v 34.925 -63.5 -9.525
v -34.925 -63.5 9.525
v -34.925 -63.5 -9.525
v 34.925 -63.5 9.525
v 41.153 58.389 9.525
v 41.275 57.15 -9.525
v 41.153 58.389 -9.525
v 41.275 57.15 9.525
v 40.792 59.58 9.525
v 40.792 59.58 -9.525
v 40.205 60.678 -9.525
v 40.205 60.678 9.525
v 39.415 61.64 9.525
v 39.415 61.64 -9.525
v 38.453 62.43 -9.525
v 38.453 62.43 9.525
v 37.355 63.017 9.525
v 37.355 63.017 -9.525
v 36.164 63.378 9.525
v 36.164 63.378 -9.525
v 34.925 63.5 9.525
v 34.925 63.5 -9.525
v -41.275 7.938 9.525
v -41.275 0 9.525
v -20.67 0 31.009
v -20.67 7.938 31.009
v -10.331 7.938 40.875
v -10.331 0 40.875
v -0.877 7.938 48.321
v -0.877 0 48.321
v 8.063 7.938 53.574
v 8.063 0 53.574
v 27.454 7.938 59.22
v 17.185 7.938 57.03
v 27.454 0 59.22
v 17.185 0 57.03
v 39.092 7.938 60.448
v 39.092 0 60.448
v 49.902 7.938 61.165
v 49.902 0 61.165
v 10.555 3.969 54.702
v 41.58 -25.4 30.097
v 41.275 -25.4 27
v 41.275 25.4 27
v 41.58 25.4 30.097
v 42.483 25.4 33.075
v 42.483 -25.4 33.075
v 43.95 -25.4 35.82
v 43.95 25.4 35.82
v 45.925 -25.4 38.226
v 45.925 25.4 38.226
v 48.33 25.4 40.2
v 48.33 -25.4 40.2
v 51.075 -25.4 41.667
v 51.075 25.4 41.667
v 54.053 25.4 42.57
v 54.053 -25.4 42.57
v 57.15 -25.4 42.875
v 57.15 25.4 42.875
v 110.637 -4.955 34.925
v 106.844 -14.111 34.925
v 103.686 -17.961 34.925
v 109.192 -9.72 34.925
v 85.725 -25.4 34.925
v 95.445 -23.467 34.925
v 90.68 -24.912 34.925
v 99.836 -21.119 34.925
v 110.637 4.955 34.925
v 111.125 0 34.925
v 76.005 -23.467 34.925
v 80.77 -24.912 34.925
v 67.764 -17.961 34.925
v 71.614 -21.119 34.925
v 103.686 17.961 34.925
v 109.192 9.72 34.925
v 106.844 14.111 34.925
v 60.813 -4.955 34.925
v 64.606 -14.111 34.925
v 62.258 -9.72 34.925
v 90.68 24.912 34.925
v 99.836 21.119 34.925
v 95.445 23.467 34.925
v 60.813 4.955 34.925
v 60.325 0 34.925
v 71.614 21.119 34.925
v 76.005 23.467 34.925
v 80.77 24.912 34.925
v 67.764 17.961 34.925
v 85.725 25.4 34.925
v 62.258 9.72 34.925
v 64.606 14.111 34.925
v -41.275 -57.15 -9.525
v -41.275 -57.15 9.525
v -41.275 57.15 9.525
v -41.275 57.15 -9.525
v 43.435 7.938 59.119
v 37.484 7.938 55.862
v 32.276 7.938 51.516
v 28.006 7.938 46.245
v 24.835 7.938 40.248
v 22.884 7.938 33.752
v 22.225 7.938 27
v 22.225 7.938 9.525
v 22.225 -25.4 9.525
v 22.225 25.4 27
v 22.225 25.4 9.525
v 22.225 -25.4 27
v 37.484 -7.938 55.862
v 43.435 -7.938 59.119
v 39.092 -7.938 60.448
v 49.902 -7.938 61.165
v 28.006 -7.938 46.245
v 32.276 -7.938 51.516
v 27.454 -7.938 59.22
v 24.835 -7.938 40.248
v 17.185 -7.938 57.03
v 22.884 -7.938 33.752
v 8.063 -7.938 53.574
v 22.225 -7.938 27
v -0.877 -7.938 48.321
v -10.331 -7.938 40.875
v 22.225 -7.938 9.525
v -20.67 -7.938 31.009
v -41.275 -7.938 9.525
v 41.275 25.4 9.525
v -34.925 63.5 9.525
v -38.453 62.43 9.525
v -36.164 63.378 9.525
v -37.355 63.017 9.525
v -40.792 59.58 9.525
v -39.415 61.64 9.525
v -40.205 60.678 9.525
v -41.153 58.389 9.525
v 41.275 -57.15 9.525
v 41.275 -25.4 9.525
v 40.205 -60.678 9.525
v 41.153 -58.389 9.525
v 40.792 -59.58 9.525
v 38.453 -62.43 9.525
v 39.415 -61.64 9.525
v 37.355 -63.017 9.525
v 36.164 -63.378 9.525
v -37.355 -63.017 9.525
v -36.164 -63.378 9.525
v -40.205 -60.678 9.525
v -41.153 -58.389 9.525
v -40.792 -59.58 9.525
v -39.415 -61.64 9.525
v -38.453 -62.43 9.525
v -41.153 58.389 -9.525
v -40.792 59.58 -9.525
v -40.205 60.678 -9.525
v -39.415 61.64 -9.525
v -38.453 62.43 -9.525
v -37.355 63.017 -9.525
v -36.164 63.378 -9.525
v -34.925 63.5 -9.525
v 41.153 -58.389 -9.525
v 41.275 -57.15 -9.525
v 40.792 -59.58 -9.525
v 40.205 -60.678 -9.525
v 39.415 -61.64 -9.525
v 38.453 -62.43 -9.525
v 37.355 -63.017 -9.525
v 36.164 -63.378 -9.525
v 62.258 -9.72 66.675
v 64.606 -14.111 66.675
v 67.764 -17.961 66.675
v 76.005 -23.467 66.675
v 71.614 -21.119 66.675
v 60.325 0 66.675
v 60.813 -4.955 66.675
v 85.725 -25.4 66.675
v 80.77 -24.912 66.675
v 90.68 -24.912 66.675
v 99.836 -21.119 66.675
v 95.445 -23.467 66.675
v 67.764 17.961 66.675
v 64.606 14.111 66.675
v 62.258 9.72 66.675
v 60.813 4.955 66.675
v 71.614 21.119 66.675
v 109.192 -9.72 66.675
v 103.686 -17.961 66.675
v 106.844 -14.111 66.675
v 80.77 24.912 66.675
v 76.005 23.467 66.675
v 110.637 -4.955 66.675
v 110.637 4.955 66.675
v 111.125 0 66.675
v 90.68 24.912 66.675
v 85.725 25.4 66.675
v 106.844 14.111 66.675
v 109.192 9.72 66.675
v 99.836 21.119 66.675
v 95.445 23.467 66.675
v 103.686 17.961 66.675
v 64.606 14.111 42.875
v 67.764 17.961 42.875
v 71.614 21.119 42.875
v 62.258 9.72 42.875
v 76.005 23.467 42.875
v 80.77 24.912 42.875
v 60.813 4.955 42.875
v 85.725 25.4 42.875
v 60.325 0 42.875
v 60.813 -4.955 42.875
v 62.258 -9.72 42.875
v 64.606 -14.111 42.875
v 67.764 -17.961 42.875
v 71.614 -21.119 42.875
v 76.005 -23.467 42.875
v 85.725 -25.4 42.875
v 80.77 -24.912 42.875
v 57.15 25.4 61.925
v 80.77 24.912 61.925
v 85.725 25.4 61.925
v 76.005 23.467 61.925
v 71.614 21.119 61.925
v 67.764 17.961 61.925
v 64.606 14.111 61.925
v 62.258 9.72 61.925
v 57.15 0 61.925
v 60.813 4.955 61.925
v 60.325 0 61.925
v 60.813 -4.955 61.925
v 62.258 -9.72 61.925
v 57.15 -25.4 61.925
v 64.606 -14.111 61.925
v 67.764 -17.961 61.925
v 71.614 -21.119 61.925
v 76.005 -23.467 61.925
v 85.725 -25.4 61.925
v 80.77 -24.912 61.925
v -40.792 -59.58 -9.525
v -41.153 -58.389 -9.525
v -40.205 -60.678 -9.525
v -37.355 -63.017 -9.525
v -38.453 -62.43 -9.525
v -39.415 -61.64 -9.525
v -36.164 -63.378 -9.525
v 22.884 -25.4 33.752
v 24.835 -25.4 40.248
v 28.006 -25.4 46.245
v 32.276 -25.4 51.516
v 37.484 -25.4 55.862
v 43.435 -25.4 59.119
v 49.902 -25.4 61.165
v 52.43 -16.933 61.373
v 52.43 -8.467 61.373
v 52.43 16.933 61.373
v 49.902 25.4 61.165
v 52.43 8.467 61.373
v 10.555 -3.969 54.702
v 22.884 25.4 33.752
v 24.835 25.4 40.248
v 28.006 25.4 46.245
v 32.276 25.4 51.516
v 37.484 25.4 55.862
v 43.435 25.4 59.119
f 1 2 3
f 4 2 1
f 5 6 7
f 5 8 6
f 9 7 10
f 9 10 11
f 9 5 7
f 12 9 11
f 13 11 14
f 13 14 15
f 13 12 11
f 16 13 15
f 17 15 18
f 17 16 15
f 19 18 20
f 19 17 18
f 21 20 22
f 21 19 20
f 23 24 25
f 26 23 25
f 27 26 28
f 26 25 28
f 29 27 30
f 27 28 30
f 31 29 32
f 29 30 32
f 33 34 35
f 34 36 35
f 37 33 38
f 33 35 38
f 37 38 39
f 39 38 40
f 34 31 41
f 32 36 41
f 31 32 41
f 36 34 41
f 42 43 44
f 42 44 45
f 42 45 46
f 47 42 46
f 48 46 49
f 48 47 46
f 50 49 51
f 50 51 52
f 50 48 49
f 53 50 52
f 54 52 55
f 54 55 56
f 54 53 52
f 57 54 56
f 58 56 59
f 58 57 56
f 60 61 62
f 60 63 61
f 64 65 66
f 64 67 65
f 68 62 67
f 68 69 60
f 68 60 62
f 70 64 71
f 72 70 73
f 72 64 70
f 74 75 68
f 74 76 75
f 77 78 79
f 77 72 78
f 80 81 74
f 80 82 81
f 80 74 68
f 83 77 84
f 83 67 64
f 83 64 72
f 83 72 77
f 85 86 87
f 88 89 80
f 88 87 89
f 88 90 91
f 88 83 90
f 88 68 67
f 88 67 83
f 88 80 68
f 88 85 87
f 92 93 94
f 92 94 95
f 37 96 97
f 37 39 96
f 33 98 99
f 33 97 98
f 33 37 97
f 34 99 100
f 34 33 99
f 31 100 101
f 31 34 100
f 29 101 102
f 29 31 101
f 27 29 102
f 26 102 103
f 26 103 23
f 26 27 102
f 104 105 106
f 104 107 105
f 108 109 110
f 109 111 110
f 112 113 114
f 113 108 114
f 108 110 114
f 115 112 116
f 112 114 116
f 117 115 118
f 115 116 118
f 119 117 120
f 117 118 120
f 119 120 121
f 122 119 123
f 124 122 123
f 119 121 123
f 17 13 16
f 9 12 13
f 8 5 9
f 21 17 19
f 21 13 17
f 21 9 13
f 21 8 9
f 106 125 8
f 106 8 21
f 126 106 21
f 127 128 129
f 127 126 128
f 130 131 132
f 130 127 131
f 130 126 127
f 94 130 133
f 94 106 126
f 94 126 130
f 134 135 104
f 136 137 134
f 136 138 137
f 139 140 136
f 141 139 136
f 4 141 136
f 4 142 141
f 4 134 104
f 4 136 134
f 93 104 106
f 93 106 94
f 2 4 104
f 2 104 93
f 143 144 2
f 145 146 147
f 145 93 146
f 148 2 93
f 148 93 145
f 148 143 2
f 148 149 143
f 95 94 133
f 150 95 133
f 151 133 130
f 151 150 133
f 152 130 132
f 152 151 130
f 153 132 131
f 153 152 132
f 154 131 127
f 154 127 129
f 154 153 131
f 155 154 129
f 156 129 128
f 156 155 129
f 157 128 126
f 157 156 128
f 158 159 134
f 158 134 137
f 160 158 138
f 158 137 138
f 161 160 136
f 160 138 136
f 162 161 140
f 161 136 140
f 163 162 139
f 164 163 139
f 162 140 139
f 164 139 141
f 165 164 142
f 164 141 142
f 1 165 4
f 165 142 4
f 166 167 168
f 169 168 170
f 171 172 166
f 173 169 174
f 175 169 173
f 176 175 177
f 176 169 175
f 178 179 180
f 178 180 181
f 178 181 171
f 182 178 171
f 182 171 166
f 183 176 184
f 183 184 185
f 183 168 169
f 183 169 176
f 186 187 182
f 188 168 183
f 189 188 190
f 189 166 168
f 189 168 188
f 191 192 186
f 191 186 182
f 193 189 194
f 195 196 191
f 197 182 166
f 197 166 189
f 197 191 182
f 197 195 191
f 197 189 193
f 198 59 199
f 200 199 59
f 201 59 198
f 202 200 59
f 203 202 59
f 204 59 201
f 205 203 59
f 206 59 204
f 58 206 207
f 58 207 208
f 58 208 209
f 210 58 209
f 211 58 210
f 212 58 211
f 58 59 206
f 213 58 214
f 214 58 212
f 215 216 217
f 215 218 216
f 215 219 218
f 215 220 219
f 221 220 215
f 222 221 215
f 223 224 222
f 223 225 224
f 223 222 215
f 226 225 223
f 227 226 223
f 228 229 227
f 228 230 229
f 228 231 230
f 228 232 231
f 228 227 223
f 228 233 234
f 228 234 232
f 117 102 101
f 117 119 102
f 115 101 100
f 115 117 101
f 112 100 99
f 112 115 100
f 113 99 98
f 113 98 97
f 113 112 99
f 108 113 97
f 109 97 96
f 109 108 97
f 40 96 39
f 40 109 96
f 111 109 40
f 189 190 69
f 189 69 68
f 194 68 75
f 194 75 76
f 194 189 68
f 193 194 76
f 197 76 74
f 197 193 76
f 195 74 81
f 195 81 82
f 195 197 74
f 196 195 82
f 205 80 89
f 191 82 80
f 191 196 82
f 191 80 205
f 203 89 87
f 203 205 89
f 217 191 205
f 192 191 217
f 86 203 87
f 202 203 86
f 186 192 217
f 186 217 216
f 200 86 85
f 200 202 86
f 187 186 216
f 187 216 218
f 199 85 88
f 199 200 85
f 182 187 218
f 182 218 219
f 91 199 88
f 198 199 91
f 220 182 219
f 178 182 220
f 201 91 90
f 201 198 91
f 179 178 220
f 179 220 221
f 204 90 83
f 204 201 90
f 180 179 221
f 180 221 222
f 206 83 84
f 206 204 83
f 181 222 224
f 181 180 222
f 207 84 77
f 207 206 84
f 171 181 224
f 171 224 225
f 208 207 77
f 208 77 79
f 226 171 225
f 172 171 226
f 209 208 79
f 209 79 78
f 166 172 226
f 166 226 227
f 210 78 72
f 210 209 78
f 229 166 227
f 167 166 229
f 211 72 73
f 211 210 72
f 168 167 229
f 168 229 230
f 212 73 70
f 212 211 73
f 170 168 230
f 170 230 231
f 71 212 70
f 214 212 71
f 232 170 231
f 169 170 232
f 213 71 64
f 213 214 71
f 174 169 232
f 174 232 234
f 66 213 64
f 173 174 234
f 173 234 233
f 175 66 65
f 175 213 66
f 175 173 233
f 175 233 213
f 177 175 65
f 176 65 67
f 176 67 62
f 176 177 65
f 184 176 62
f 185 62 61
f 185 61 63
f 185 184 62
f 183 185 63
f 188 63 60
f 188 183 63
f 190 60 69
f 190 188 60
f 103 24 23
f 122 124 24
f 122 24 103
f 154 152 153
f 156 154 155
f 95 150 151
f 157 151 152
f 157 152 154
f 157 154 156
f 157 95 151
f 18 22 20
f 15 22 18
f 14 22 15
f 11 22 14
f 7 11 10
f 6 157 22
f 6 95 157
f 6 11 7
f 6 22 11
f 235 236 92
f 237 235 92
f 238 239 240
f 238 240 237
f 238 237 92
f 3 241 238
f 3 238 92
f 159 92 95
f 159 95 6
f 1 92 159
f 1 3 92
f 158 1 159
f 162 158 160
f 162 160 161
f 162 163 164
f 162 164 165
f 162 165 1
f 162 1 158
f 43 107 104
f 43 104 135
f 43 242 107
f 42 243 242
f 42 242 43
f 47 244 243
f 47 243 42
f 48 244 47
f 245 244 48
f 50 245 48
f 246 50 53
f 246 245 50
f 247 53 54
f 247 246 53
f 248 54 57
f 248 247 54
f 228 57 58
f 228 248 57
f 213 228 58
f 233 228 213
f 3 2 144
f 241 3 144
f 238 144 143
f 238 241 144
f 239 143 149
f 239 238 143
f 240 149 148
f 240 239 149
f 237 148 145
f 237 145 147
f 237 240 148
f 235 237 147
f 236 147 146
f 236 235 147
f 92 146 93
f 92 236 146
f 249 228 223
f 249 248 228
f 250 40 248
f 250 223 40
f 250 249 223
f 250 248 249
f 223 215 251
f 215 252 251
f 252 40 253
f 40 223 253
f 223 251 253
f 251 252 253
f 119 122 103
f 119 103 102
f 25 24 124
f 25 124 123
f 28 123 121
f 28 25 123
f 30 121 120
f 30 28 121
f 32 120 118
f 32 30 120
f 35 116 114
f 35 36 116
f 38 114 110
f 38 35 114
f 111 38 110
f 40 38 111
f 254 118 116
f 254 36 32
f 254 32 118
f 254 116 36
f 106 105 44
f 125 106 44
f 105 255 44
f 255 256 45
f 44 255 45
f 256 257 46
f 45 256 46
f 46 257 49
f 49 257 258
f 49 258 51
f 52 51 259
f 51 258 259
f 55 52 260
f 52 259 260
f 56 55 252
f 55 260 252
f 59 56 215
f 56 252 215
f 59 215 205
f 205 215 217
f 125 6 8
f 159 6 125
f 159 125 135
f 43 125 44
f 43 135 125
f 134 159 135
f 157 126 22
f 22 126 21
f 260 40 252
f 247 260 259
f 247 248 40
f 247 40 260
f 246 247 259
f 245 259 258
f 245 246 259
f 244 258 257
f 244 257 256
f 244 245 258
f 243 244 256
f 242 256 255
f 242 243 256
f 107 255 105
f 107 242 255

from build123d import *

# Parameters (mm, degrees)
F1_DEPTH = 63.5
F0_W     = 25.4
F0_H     = 19.05
F2_DEPTH = 25.4
F3_DEPTH = 7.9375
F5_R     = 6.35


with BuildPart() as f1:
    # F0 (on Front) → F1 (new body, symmetric)
    with BuildSketch(Plane.XZ):
        Polygon((22.225, 9.525), (-41.275, 9.525), (-41.275, -9.525), (41.275, -9.525), (41.275, 9.525), align=None)
    extrude(amount=F1_DEPTH, both=True)

    # F0 (on Front) → F2 (join, symmetric)
    with BuildSketch(Plane.XZ):
        with BuildLine():
            Line((22.225, 27.0002), (22.225, 9.525))
            Line((22.225, 9.525), (41.275, 9.525))
            Line((41.275, 9.525), (41.275, 27.0002))
            ThreePointArc((41.275, 27.0002), (45.9246798487, 38.2255201513), (57.15, 42.8752))
            Line((57.15, 42.8752), (60.325, 42.8752))
            Line((60.325, 42.8752), (60.325, 61.9252))
            Line((60.325, 61.9252), (57.15, 61.9252))
            add(Edge.make_bspline(
                [(49.9023052217, 61.1648973556), (52.4810313579, 61.358329757), (54.9137397508, 61.5896523225), (57.15, 61.9252)],
                knots=[0.9180865777, 0.9180865777, 0.9180865777, 0.9180865777, 1, 1, 1, 1], degree=3))
            ThreePointArc((49.9023052217, 61.1648973556), (30.0125593954, 48.9846249967), (22.225, 27.0002))
        make_face()
        with Locations((73.025, 52.4002)):
            Rectangle(F0_W, F0_H)
    extrude(amount=F2_DEPTH, both=True)

    # F0 (on Front) → F4 (revolve)
    with BuildSketch(Plane.XZ):
        Polygon((85.725, 66.675), (85.725, 61.9252), (85.725, 42.8752), (85.725, 34.925), (111.125, 34.925), (111.125, 66.675), align=None)
    revolve(axis=Axis((85.725, 0, 50.8), (0, 0, 1)))

    # F5
    f5_edges = [f1.edges().sort_by_distance(p)[0] for p in [
        (-41.275, -63.5, 0),
        (41.275, -63.5, 0),
        (41.275, 63.5, 0),
        (-41.275, 63.5, 0),
    ]]
    fillet(f5_edges, radius=F5_R)


with BuildPart() as f3:
    # F0 (on Front) → F3 (new body, symmetric)
    with BuildSketch(Plane.XZ):
        with BuildLine():
            add(Edge.make_bspline(
                [(-41.275, 9.525), (-24.0563050105, 26.8108303996), (1.9041946675, 60.0444502626), (38.2204106126, 60.2886286836), (49.9023052217, 61.1648973556)],
                knots=[0, 0, 0, 0, 0.54701035, 0.9180865777, 0.9180865777, 0.9180865777, 0.9180865777], degree=3))
            Line((-41.275, 9.525), (22.225, 9.525))
            Line((22.225, 9.525), (22.225, 27.0002))
            ThreePointArc((22.225, 27.0002), (30.0125593954, 48.9846249967), (49.9023052217, 61.1648973556))
        make_face()
    extrude(amount=F3_DEPTH, both=True)


solid = Compound([f1.part, f3.part])
